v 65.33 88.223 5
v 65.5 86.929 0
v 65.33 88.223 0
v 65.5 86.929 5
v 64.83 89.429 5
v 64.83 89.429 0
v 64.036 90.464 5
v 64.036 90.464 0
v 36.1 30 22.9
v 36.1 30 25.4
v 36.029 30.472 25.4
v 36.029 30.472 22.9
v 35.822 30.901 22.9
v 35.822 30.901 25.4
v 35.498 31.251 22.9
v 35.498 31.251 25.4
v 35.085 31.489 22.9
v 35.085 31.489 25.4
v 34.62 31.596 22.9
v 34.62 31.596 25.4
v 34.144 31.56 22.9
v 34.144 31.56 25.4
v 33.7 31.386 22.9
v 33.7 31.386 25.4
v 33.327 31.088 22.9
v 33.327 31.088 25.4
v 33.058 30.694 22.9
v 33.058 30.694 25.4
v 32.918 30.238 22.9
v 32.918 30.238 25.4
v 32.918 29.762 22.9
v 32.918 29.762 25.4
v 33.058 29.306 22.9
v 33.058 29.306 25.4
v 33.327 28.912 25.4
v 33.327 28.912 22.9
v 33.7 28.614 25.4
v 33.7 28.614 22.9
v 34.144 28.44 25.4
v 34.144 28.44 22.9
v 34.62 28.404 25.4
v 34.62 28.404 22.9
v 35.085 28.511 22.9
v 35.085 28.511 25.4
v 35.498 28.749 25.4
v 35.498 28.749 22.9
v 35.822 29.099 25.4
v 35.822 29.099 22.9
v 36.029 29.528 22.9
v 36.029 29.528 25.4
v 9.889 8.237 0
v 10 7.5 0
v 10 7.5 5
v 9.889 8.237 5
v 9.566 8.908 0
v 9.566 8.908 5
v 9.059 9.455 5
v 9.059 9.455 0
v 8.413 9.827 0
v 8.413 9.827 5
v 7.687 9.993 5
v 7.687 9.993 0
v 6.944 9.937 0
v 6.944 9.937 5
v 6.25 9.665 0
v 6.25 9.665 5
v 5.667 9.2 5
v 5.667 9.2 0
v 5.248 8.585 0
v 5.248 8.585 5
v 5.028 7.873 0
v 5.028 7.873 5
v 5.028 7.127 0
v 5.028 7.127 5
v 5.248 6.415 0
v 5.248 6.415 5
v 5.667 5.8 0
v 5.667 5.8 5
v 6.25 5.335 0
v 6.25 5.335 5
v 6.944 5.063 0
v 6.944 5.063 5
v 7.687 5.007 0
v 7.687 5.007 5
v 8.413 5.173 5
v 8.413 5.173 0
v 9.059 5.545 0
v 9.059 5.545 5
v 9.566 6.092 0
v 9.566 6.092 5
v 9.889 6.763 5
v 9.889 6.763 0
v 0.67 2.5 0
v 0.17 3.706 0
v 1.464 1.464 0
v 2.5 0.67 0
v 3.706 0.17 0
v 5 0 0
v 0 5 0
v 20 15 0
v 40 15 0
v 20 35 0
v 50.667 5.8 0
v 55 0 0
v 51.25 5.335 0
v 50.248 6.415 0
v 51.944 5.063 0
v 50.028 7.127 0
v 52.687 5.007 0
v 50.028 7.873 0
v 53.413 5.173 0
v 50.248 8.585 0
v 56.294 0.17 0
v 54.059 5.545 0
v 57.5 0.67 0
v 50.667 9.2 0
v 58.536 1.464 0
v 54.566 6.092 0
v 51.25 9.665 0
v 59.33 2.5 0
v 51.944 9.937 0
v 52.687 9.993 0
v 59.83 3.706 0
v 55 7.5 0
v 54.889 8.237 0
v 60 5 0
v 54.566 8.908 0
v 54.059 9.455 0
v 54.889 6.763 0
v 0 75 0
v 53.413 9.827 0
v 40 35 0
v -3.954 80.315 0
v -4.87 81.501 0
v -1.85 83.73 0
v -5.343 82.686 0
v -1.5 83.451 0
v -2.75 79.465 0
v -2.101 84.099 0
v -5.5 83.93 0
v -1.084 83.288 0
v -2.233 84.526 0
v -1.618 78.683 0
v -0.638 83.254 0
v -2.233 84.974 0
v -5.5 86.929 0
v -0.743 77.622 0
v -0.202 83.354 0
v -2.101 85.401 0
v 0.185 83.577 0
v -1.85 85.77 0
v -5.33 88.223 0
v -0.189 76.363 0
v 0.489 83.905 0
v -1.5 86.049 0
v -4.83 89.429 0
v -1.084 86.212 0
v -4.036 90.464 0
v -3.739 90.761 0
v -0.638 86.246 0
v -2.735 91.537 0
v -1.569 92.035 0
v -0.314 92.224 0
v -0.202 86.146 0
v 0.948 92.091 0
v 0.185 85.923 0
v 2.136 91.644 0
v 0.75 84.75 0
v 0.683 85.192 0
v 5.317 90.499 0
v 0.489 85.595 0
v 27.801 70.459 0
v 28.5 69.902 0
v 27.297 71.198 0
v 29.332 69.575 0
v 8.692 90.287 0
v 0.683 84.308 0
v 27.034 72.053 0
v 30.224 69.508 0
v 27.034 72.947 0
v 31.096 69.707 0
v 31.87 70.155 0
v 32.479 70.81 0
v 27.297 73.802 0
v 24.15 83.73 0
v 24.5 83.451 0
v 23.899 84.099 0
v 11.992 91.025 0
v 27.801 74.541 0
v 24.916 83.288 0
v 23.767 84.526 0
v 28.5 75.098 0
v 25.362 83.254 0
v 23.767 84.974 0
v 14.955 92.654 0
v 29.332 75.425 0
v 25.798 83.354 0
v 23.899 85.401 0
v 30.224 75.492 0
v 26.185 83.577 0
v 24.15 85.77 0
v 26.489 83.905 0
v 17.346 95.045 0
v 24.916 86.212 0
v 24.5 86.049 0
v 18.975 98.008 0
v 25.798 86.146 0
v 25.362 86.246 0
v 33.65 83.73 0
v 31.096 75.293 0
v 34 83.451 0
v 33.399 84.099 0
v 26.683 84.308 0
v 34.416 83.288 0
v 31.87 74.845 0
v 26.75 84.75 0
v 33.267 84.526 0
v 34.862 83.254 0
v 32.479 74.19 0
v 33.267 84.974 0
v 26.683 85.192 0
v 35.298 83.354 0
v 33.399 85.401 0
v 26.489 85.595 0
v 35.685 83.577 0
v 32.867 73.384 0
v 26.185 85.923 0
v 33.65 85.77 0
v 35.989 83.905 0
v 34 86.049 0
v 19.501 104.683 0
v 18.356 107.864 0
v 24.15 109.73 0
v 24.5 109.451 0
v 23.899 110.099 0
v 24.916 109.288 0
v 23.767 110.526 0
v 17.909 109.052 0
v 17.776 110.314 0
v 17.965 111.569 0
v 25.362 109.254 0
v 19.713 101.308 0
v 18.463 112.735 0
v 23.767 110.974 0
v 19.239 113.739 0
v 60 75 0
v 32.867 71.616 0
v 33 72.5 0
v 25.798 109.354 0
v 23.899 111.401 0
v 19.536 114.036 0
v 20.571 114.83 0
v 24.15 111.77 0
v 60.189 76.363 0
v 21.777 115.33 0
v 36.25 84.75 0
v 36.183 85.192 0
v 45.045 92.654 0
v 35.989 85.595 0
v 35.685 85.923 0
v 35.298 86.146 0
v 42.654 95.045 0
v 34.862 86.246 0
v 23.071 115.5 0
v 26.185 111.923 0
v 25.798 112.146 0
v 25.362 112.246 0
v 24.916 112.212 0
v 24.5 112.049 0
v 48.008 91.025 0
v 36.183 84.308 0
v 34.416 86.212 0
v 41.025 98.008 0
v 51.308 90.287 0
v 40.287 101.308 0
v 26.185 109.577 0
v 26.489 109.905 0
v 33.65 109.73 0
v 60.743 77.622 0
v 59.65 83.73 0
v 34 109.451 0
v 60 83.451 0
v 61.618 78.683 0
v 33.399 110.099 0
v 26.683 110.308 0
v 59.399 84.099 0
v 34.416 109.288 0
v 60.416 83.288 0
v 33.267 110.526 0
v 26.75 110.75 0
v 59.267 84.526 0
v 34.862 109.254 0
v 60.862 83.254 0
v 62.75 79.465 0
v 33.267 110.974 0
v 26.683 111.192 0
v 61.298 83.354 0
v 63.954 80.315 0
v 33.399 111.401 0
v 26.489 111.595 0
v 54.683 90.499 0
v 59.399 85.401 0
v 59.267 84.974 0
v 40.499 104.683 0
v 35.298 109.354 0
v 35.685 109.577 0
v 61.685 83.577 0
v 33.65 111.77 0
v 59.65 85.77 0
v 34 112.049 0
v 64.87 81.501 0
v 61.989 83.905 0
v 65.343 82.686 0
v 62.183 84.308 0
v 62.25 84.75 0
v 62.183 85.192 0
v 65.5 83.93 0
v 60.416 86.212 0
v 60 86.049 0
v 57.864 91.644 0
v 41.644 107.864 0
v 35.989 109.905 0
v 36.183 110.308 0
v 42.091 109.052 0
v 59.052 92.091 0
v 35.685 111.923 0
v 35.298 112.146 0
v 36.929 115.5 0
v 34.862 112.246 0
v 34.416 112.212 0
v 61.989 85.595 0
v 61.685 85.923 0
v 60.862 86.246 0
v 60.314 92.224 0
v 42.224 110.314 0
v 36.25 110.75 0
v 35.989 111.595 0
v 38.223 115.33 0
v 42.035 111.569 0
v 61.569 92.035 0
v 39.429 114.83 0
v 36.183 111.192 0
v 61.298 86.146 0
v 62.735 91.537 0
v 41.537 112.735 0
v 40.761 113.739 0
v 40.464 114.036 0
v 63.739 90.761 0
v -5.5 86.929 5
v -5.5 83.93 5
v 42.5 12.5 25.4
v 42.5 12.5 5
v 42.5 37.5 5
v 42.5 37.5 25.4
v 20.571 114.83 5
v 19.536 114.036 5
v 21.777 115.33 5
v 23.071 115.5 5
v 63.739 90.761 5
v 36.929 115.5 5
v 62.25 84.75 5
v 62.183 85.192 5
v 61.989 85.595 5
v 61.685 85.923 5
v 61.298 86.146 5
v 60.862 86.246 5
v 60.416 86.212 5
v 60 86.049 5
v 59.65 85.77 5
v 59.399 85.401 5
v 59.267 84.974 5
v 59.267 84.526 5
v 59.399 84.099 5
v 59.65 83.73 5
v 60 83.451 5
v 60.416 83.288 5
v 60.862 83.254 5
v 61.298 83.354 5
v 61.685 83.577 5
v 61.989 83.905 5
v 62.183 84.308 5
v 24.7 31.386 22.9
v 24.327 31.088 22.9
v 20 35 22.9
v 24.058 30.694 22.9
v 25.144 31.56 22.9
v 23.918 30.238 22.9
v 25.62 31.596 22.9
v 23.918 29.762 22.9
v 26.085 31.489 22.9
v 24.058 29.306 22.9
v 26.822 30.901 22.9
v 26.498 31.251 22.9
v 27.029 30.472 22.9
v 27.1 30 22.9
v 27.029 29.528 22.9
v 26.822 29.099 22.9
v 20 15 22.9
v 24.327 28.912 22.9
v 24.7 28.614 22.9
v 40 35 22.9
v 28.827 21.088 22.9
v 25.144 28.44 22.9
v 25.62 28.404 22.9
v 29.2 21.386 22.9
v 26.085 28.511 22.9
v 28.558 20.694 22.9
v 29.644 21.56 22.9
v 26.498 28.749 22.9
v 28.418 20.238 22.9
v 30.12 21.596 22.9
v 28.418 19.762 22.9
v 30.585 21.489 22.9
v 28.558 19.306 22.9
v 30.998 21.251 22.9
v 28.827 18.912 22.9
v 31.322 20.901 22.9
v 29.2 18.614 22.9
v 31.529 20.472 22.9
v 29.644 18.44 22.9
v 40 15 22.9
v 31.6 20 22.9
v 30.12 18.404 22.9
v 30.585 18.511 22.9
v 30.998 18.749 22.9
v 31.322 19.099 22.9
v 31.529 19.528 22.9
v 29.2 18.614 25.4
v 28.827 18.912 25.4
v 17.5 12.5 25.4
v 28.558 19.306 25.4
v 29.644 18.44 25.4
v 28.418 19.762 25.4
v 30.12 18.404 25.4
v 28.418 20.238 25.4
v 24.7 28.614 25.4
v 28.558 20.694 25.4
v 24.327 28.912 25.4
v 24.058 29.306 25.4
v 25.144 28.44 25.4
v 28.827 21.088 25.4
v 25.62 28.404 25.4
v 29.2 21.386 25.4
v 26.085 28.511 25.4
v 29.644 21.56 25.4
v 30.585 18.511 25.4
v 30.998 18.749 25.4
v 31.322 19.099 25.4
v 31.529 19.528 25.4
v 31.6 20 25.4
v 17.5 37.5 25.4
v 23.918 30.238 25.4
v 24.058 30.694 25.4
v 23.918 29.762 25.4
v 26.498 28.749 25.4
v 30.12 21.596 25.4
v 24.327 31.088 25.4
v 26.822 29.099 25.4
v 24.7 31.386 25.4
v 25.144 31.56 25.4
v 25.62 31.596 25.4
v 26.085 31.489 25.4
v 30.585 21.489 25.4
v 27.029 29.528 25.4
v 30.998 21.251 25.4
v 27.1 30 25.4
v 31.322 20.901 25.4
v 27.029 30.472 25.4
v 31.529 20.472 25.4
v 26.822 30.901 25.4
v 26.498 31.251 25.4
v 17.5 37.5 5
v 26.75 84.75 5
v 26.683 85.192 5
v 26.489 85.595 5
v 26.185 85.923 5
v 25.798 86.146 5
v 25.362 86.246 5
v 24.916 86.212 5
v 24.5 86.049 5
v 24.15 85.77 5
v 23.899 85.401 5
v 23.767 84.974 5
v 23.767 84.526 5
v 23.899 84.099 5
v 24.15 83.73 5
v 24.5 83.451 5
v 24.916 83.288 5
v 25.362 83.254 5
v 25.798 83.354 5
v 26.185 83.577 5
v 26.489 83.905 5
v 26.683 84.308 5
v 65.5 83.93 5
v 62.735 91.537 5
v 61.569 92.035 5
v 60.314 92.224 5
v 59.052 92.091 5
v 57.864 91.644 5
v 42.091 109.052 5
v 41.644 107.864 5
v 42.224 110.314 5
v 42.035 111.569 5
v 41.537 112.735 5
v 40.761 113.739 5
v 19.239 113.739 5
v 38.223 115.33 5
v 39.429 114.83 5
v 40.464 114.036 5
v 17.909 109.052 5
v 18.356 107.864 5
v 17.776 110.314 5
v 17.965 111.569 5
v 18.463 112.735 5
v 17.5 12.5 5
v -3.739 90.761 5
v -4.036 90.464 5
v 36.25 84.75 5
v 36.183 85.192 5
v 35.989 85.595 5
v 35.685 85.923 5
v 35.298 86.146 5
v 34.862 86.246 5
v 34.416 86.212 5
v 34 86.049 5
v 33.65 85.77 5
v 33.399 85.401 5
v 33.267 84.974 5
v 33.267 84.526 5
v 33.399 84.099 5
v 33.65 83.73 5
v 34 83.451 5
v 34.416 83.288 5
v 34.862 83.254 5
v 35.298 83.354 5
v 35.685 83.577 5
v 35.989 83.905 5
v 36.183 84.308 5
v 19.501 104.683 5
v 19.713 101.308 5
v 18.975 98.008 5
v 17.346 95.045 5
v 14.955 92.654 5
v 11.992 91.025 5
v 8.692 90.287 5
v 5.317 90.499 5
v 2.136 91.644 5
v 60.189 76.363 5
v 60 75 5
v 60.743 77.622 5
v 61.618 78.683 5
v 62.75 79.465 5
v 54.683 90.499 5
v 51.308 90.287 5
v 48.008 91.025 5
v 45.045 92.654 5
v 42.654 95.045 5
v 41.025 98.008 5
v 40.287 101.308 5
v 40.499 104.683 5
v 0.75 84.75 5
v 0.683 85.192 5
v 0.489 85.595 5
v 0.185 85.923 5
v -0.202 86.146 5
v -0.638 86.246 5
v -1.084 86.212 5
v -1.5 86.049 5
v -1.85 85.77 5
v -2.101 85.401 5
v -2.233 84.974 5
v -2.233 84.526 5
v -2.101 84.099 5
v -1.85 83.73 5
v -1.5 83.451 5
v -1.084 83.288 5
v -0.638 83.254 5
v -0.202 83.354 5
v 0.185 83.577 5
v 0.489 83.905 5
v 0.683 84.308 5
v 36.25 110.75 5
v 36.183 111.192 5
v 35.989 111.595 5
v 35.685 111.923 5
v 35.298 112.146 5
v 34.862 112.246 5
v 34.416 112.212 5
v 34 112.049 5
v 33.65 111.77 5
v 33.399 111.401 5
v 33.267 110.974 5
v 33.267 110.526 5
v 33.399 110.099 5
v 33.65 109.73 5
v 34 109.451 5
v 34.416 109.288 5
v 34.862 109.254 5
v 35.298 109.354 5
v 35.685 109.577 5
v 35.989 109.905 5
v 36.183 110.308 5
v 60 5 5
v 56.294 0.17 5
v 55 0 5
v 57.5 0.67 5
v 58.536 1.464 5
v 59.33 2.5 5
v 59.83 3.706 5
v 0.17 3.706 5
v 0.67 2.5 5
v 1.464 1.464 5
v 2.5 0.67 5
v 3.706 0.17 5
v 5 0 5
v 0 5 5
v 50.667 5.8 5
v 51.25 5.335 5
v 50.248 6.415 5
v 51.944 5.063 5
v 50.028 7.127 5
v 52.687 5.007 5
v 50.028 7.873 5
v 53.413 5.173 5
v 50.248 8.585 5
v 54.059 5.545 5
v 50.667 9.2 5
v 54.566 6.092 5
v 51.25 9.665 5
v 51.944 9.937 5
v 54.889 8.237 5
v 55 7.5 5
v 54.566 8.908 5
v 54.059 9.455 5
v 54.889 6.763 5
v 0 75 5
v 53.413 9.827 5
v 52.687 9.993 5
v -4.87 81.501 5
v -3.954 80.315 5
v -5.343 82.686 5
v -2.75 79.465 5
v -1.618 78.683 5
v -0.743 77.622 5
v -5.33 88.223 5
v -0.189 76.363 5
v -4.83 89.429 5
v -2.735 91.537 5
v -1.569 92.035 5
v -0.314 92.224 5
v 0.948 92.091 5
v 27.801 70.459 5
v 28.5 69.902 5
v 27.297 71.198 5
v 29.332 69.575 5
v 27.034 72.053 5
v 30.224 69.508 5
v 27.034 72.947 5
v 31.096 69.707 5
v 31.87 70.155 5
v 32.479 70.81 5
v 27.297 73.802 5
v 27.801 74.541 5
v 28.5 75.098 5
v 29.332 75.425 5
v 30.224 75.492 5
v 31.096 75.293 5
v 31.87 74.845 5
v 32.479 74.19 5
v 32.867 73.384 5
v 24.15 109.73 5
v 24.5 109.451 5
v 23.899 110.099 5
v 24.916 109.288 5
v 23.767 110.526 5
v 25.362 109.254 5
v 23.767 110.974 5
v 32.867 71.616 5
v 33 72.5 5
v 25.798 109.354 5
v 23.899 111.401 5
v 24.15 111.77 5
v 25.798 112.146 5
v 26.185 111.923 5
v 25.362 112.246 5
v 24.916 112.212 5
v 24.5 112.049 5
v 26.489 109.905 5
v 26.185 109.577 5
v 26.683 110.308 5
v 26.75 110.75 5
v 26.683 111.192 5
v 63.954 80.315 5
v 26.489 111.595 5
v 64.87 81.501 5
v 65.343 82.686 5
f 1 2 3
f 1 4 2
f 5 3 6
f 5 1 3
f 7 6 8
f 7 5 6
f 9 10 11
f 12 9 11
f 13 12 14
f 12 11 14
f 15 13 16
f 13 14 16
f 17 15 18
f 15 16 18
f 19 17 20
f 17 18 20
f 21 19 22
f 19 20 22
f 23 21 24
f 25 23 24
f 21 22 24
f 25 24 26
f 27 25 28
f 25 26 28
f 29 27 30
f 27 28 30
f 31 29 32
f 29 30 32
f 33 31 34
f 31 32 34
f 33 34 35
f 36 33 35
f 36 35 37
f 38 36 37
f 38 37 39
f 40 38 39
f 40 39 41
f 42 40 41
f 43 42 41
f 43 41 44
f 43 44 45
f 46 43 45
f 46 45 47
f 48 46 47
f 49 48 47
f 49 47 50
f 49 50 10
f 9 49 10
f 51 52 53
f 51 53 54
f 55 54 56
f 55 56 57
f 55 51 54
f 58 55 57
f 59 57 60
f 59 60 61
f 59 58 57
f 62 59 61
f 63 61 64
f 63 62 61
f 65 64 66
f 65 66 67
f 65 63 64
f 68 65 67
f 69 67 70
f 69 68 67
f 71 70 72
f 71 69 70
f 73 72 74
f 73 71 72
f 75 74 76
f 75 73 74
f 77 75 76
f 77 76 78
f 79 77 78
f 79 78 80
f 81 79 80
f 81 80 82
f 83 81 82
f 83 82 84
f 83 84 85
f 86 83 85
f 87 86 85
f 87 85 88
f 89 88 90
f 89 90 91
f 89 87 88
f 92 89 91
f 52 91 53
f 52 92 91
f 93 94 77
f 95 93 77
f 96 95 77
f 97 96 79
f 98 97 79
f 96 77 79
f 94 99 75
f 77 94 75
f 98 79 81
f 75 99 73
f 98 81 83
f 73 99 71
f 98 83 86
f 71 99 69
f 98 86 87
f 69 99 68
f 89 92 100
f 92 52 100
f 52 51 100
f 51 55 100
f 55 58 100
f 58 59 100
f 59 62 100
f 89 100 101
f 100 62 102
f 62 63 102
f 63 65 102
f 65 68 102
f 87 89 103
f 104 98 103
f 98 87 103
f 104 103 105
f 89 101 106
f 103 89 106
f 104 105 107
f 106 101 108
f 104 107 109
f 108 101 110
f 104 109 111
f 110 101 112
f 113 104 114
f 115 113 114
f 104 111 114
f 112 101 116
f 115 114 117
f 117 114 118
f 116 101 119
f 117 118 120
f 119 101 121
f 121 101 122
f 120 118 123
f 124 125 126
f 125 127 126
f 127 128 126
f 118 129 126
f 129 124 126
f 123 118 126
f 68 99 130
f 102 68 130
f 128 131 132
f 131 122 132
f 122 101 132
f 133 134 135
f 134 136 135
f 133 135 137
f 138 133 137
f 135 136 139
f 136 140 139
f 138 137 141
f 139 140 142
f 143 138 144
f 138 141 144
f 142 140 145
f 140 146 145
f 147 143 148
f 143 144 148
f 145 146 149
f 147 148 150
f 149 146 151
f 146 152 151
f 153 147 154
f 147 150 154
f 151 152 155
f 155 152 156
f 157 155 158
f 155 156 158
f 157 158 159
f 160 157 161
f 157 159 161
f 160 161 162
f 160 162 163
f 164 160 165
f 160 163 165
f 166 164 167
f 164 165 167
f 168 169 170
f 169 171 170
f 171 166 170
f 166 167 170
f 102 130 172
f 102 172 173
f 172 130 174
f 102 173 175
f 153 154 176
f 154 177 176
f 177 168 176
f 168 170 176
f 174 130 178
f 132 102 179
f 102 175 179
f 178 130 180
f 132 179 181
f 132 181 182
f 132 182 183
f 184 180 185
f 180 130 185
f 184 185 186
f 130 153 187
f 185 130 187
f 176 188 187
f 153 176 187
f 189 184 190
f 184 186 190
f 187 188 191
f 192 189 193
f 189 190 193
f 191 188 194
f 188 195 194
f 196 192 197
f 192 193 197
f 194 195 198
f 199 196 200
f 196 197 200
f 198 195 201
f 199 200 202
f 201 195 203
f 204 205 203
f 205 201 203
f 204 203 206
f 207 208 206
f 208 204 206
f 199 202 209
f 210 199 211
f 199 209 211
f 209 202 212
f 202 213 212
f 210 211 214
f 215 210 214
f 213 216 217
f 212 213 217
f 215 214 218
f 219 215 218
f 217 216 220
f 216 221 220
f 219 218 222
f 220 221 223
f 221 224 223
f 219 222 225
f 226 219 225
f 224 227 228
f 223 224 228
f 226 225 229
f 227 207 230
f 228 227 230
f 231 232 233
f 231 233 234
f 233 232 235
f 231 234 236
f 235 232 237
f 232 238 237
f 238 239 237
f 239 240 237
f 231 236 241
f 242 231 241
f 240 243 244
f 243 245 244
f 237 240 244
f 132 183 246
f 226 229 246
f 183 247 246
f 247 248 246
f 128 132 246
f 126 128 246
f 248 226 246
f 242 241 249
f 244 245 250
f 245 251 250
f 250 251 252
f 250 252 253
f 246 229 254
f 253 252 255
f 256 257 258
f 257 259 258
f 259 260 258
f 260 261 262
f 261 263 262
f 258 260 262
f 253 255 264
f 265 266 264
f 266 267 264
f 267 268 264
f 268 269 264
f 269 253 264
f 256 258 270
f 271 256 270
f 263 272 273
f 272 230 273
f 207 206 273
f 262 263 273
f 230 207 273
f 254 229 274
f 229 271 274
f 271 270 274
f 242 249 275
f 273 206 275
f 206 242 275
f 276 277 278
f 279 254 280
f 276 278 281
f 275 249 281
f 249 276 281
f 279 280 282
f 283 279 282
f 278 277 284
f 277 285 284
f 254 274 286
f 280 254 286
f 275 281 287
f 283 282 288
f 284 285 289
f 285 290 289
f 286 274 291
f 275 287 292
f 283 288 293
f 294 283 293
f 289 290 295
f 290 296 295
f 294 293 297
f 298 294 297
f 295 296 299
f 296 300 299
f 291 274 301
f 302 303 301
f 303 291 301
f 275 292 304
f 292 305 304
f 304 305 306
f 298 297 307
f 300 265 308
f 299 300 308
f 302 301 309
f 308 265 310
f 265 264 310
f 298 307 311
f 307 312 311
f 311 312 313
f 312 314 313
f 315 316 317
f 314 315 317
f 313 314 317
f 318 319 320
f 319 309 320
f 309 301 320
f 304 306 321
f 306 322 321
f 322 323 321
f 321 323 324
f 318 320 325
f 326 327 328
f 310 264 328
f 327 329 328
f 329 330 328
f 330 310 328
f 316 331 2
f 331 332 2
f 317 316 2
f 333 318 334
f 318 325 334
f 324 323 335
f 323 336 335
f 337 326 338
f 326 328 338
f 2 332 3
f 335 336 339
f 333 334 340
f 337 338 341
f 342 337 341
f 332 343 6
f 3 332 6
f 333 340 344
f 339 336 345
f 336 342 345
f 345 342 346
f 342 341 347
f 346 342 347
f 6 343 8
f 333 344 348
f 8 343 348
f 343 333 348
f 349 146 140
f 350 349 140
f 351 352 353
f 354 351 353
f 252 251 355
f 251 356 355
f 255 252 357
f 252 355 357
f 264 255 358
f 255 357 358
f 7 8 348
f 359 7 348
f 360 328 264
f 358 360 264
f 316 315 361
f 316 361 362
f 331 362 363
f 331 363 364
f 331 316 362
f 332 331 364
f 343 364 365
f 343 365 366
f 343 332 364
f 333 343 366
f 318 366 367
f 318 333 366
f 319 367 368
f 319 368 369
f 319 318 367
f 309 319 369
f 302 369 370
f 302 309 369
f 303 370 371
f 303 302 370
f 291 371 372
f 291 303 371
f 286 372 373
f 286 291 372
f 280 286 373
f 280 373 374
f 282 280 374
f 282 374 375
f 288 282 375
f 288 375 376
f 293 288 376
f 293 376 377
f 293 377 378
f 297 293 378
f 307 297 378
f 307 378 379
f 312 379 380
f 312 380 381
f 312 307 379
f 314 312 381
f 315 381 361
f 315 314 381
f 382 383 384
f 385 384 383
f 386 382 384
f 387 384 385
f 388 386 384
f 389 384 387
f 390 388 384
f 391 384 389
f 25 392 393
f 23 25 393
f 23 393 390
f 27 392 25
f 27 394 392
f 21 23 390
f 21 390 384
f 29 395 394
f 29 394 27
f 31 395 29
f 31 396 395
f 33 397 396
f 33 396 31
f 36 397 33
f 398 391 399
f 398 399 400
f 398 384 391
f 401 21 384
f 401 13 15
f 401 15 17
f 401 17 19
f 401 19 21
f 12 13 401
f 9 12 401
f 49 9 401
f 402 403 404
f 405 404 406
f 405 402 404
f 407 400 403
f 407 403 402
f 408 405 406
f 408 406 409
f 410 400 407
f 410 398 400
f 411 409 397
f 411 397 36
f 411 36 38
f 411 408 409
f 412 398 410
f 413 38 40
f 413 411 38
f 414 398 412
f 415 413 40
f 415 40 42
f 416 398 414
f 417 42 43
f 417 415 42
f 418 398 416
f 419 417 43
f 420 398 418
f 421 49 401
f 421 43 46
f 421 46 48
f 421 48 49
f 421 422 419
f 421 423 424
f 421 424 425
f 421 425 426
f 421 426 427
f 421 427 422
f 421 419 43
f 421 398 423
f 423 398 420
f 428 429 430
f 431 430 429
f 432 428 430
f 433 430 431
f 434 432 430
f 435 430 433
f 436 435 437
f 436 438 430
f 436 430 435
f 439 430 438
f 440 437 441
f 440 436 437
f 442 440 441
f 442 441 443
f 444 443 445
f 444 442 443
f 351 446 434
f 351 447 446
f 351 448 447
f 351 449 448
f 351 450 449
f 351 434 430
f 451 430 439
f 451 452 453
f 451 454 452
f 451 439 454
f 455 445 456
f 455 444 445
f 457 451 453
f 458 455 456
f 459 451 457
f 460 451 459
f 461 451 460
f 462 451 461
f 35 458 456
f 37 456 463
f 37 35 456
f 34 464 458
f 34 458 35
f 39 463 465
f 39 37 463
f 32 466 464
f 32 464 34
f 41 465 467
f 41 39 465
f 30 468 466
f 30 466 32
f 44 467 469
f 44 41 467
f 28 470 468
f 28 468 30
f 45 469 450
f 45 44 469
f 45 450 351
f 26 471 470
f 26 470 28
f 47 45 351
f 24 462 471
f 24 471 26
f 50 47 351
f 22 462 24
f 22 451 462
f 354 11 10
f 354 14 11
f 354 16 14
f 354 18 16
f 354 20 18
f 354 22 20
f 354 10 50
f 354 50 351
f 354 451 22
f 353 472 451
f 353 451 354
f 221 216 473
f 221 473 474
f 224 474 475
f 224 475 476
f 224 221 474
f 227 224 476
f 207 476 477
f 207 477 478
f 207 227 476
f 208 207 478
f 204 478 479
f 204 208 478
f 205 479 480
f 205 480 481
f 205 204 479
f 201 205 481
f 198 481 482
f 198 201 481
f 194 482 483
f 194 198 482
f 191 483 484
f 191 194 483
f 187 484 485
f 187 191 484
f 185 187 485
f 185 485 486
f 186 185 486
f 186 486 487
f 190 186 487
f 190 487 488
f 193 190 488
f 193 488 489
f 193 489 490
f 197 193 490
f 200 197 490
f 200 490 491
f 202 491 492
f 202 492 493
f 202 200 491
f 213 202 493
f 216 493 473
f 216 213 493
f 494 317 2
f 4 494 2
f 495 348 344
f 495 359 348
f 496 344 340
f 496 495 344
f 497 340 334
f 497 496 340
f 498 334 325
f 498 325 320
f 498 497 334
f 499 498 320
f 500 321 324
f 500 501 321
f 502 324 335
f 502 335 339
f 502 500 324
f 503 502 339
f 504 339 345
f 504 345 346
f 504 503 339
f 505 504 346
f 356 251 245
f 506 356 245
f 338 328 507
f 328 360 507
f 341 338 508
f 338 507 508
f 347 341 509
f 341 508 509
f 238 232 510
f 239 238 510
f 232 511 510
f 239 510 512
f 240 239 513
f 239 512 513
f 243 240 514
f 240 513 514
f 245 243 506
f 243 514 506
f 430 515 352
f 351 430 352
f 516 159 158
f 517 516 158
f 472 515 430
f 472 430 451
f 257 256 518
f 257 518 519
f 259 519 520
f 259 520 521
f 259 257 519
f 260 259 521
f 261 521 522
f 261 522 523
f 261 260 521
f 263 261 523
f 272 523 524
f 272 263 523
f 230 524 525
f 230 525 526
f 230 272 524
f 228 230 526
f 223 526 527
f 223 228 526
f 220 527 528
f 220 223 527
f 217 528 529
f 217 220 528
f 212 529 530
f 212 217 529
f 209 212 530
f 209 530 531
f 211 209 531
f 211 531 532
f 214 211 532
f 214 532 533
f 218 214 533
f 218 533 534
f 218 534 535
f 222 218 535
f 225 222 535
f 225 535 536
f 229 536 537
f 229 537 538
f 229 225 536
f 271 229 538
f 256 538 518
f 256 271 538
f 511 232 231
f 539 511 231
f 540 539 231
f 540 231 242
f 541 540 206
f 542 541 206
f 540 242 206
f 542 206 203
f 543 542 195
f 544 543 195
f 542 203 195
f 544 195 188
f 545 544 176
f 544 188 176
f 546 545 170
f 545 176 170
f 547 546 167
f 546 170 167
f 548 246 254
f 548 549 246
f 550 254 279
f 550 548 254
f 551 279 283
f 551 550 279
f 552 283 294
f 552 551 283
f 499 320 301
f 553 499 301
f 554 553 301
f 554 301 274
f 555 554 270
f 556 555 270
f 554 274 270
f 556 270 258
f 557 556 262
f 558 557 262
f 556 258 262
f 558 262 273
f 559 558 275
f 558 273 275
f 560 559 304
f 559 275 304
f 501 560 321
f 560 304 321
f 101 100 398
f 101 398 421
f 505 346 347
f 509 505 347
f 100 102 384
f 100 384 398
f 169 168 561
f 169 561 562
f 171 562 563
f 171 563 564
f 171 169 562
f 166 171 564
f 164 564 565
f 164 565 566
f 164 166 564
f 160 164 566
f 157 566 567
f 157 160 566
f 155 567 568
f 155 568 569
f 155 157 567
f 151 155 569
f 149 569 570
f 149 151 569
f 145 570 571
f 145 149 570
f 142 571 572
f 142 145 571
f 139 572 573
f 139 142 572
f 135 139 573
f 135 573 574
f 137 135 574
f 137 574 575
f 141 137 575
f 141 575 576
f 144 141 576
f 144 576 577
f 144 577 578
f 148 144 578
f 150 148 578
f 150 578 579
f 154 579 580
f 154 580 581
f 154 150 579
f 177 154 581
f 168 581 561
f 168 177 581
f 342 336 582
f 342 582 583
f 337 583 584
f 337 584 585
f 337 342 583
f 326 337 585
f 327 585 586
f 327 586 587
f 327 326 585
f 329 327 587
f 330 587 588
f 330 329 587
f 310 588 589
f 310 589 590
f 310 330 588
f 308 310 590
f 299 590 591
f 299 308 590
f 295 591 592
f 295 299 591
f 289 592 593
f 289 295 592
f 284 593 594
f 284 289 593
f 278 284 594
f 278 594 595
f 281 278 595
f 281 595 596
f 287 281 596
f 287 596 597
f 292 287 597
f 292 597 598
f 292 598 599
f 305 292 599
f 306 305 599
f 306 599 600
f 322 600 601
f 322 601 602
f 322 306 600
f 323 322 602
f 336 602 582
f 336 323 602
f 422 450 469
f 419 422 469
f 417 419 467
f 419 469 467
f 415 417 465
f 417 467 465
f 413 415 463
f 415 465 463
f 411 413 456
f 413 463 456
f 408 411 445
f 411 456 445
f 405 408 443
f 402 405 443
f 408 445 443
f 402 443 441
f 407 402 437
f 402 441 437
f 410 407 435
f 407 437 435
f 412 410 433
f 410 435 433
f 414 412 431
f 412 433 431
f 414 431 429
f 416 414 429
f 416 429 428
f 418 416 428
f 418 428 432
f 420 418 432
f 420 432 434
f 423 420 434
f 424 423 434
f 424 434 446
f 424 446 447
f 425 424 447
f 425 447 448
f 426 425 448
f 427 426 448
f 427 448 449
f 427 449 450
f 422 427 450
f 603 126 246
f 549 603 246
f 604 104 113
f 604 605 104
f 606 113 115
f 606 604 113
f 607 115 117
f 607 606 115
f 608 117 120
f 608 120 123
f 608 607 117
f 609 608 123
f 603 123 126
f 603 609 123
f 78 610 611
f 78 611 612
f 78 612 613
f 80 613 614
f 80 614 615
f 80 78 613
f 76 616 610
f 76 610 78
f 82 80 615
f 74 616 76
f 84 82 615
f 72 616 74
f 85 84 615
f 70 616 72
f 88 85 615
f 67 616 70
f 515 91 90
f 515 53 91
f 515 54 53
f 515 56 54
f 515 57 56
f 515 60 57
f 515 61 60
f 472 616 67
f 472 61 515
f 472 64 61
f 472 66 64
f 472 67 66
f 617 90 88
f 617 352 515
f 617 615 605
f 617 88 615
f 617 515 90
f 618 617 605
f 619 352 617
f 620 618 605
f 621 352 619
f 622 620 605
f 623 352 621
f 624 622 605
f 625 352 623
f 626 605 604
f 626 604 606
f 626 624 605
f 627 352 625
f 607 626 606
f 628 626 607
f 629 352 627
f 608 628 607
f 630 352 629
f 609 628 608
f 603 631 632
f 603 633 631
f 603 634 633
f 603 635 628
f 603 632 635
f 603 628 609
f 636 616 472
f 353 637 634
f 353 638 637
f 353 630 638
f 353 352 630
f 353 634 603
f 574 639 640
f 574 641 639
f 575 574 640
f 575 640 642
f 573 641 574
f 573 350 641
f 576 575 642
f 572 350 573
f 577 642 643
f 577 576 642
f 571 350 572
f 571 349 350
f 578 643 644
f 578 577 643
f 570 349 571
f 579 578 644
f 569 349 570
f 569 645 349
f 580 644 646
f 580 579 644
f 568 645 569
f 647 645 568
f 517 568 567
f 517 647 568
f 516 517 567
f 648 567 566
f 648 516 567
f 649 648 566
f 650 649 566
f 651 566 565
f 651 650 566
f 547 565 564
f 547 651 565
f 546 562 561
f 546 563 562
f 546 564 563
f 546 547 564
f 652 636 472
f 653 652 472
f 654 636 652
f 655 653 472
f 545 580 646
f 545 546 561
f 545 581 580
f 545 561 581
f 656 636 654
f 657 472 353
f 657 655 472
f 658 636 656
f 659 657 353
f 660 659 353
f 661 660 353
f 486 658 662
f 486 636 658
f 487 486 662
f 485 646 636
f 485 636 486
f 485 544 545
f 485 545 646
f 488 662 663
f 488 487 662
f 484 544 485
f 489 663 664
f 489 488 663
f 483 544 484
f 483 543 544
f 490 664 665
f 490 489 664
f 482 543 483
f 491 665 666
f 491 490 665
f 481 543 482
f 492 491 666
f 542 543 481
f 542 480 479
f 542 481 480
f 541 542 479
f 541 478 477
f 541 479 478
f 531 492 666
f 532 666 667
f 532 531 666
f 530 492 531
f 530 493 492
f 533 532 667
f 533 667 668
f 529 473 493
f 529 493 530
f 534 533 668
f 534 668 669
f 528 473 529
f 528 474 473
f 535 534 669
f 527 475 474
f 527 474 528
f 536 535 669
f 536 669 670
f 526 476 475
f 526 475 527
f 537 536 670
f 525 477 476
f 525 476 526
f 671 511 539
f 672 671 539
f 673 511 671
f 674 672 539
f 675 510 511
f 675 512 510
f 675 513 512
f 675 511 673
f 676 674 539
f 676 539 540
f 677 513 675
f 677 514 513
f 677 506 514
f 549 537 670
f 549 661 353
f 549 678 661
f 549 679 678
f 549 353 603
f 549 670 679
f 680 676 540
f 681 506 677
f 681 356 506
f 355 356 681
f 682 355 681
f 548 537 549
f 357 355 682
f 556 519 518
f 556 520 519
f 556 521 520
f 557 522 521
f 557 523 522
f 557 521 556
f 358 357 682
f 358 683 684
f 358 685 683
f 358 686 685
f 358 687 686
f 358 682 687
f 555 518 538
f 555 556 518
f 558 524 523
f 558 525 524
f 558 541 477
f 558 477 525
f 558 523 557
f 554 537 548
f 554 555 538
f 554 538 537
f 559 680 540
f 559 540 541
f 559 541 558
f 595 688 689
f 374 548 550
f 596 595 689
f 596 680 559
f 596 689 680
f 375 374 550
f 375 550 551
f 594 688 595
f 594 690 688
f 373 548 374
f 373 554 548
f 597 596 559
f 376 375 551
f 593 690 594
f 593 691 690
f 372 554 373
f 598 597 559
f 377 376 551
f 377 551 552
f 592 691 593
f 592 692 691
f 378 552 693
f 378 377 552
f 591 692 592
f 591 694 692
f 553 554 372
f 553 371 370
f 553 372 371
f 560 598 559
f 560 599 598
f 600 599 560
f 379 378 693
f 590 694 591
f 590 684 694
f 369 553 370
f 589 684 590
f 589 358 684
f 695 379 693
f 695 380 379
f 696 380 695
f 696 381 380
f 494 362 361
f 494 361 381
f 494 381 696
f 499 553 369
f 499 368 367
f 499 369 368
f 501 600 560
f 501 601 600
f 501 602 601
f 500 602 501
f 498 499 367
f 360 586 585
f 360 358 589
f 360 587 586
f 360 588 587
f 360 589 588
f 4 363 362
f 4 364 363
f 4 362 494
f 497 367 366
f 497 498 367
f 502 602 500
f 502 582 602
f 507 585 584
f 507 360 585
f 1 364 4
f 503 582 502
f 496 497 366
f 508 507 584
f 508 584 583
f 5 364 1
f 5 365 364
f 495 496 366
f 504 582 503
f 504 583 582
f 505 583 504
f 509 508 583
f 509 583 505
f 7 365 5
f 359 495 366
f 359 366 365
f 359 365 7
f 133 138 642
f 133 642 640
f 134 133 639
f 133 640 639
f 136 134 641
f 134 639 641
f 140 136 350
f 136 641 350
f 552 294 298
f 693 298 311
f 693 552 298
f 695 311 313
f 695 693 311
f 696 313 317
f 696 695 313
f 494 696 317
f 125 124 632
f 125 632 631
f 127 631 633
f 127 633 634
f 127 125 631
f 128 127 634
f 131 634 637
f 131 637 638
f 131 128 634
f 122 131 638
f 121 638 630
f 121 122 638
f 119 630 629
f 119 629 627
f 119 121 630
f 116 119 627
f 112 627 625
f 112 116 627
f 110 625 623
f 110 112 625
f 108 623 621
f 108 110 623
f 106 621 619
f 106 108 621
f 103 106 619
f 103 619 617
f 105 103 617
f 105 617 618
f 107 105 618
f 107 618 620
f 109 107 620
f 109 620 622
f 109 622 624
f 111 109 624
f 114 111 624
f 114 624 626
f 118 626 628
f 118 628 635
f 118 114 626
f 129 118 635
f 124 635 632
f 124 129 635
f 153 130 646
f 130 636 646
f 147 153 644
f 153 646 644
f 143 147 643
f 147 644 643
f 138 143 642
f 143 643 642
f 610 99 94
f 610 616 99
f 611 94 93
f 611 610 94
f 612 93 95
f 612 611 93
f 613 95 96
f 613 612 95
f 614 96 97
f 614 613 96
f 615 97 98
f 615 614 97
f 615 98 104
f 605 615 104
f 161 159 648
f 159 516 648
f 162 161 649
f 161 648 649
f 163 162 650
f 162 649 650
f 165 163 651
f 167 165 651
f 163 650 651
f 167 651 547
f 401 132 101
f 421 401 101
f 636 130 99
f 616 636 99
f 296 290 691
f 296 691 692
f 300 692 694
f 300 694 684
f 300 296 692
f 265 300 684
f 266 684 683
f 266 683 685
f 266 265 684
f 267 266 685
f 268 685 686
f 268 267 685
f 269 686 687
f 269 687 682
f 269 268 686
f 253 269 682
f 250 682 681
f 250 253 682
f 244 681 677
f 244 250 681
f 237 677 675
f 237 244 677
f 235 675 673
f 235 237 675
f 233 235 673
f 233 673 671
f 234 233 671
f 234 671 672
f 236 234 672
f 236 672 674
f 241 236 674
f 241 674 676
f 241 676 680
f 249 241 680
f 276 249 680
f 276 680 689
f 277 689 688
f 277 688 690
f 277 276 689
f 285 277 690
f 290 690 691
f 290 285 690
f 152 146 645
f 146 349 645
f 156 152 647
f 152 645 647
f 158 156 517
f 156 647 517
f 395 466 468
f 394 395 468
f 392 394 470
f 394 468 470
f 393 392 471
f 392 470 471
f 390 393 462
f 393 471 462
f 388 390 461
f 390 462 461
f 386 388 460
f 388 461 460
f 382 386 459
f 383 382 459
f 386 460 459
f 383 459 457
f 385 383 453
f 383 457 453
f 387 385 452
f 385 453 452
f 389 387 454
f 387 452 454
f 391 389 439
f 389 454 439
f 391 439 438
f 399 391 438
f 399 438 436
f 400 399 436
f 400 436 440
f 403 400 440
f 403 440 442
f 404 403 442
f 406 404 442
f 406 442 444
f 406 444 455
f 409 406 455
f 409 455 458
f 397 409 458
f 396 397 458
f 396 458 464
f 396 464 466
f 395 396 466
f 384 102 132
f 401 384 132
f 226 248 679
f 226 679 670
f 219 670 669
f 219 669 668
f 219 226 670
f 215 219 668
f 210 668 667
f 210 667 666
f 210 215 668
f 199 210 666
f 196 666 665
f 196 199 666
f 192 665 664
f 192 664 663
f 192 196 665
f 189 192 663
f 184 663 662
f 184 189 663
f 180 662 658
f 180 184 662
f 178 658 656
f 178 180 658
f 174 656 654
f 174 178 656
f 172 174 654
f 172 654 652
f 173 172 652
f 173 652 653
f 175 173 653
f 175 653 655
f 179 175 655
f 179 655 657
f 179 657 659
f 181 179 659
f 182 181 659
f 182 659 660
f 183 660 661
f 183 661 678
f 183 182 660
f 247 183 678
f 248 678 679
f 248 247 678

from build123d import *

# Parameters (mm, degrees)
F0_R     = 2.5
F0_R_2   = 1.5
F0_R_3   = 3
F1_DEPTH = 5
F2_R     = 5
F3_R     = 5
F4_W     = 25
F4_H     = 25
F5_DEPTH = 20.4
F6_W     = 20
F6_H     = 20
F7_DEPTH = 22.9
F8_R     = 1.6
F9_DEPTH = 25.4010001


with BuildPart() as f1:
    # F0 (on Top) → F1 (new body)
    with BuildSketch(Plane.XY):
        with BuildLine():
            Line((0, 80), (0, 0))
            Line((0, 0), (60, 0))
            Line((60, 0), (60, 80))
            Line((60, 80), (65.5, 80))
            Line((65.5, 80), (65.5, 89))
            Line((65.5, 89), (60.7352813742, 93.7647186258))
            ThreePointArc((60.7352813742, 93.7647186258), (43.7647186258, 93.7647186258), (43.7647186258, 110.7352813742))
            Line((43.7647186258, 110.7352813742), (39, 115.5))
            Line((39, 115.5), (21, 115.5))
            Line((21, 115.5), (16.2352813742, 110.7352813742))
            ThreePointArc((16.2352813742, 110.7352813742), (16.2352813742, 93.7647186258), (-0.7352813742, 93.7647186258))
            Line((-0.7352813742, 93.7647186258), (-5.5, 89))
            Line((-5.5, 89), (-5.5, 80))
            Line((-5.5, 80), (0, 80))
        make_face()
        with Locations((7.5, 7.5)):
            Circle(F0_R, mode=Mode.SUBTRACT)
        with Locations((52.5, 7.5)):
            Circle(F0_R, mode=Mode.SUBTRACT)
        with Locations((-0.75, 84.75)):
            Circle(F0_R_2, mode=Mode.SUBTRACT)
        with Locations((25.25, 84.75)):
            Circle(F0_R_2, mode=Mode.SUBTRACT)
        with Locations((25.25, 110.75)):
            Circle(F0_R_2, mode=Mode.SUBTRACT)
        with Locations((30, 72.5)):
            Circle(F0_R_3, mode=Mode.SUBTRACT)
        with Locations((34.75, 84.75)):
            Circle(F0_R_2, mode=Mode.SUBTRACT)
        with Locations((60.75, 84.75)):
            Circle(F0_R_2, mode=Mode.SUBTRACT)
        with Locations((34.75, 110.75)):
            Circle(F0_R_2, mode=Mode.SUBTRACT)
    extrude(amount=F1_DEPTH)

    # F2
    f2_edges = [f1.edges().sort_by_distance(p)[0] for p in [
        (0, 0, 2.5),
        (60, 0, 2.5),
        (-0.735281, 93.764719, 2.5),
        (-5.5, 89, 2.5),
        (0, 80, 2.5),
        (60, 80, 2.5),
        (65.5, 89, 2.5),
        (60.735281, 93.764719, 2.5),
        (43.764719, 110.735281, 2.5),
        (39, 115.5, 2.5),
        (21, 115.5, 2.5),
        (16.235281, 110.735281, 2.5),
    ]]
    fillet(f2_edges, radius=F2_R)

    # F3
    f3_edges = [f1.edges().sort_by_distance(p)[0] for p in [
        (-5.5, 80, 2.5),
        (65.5, 80, 2.5),
    ]]
    fillet(f3_edges, radius=F3_R)

    # F4 (on face) → F5 (join)
    with BuildSketch(Plane.XY.offset(5)):
        with Locations((30, 25)):
            Rectangle(F4_W, F4_H)
    extrude(amount=F5_DEPTH)

    # F6 (on face) → F7 (cut)
    with BuildSketch(Plane(origin=(0, 0, 0), x_dir=(1, 0, 0), z_dir=(0, 0, -1))):
        with Locations((30, -25)):
            Rectangle(F6_W, F6_H)
    extrude(amount=-F7_DEPTH, mode=Mode.SUBTRACT)

    # F8 (on face) → F9 (cut, through all)
    with BuildSketch(Plane.XY.offset(25.4)):
        with Locations((25.5, 30)):
            Circle(F8_R)
        with Locations((30, 20)):
            Circle(F8_R)
        with Locations((34.5, 30)):
            Circle(F8_R)
    extrude(amount=-F9_DEPTH, mode=Mode.SUBTRACT)


solid = f1.part
